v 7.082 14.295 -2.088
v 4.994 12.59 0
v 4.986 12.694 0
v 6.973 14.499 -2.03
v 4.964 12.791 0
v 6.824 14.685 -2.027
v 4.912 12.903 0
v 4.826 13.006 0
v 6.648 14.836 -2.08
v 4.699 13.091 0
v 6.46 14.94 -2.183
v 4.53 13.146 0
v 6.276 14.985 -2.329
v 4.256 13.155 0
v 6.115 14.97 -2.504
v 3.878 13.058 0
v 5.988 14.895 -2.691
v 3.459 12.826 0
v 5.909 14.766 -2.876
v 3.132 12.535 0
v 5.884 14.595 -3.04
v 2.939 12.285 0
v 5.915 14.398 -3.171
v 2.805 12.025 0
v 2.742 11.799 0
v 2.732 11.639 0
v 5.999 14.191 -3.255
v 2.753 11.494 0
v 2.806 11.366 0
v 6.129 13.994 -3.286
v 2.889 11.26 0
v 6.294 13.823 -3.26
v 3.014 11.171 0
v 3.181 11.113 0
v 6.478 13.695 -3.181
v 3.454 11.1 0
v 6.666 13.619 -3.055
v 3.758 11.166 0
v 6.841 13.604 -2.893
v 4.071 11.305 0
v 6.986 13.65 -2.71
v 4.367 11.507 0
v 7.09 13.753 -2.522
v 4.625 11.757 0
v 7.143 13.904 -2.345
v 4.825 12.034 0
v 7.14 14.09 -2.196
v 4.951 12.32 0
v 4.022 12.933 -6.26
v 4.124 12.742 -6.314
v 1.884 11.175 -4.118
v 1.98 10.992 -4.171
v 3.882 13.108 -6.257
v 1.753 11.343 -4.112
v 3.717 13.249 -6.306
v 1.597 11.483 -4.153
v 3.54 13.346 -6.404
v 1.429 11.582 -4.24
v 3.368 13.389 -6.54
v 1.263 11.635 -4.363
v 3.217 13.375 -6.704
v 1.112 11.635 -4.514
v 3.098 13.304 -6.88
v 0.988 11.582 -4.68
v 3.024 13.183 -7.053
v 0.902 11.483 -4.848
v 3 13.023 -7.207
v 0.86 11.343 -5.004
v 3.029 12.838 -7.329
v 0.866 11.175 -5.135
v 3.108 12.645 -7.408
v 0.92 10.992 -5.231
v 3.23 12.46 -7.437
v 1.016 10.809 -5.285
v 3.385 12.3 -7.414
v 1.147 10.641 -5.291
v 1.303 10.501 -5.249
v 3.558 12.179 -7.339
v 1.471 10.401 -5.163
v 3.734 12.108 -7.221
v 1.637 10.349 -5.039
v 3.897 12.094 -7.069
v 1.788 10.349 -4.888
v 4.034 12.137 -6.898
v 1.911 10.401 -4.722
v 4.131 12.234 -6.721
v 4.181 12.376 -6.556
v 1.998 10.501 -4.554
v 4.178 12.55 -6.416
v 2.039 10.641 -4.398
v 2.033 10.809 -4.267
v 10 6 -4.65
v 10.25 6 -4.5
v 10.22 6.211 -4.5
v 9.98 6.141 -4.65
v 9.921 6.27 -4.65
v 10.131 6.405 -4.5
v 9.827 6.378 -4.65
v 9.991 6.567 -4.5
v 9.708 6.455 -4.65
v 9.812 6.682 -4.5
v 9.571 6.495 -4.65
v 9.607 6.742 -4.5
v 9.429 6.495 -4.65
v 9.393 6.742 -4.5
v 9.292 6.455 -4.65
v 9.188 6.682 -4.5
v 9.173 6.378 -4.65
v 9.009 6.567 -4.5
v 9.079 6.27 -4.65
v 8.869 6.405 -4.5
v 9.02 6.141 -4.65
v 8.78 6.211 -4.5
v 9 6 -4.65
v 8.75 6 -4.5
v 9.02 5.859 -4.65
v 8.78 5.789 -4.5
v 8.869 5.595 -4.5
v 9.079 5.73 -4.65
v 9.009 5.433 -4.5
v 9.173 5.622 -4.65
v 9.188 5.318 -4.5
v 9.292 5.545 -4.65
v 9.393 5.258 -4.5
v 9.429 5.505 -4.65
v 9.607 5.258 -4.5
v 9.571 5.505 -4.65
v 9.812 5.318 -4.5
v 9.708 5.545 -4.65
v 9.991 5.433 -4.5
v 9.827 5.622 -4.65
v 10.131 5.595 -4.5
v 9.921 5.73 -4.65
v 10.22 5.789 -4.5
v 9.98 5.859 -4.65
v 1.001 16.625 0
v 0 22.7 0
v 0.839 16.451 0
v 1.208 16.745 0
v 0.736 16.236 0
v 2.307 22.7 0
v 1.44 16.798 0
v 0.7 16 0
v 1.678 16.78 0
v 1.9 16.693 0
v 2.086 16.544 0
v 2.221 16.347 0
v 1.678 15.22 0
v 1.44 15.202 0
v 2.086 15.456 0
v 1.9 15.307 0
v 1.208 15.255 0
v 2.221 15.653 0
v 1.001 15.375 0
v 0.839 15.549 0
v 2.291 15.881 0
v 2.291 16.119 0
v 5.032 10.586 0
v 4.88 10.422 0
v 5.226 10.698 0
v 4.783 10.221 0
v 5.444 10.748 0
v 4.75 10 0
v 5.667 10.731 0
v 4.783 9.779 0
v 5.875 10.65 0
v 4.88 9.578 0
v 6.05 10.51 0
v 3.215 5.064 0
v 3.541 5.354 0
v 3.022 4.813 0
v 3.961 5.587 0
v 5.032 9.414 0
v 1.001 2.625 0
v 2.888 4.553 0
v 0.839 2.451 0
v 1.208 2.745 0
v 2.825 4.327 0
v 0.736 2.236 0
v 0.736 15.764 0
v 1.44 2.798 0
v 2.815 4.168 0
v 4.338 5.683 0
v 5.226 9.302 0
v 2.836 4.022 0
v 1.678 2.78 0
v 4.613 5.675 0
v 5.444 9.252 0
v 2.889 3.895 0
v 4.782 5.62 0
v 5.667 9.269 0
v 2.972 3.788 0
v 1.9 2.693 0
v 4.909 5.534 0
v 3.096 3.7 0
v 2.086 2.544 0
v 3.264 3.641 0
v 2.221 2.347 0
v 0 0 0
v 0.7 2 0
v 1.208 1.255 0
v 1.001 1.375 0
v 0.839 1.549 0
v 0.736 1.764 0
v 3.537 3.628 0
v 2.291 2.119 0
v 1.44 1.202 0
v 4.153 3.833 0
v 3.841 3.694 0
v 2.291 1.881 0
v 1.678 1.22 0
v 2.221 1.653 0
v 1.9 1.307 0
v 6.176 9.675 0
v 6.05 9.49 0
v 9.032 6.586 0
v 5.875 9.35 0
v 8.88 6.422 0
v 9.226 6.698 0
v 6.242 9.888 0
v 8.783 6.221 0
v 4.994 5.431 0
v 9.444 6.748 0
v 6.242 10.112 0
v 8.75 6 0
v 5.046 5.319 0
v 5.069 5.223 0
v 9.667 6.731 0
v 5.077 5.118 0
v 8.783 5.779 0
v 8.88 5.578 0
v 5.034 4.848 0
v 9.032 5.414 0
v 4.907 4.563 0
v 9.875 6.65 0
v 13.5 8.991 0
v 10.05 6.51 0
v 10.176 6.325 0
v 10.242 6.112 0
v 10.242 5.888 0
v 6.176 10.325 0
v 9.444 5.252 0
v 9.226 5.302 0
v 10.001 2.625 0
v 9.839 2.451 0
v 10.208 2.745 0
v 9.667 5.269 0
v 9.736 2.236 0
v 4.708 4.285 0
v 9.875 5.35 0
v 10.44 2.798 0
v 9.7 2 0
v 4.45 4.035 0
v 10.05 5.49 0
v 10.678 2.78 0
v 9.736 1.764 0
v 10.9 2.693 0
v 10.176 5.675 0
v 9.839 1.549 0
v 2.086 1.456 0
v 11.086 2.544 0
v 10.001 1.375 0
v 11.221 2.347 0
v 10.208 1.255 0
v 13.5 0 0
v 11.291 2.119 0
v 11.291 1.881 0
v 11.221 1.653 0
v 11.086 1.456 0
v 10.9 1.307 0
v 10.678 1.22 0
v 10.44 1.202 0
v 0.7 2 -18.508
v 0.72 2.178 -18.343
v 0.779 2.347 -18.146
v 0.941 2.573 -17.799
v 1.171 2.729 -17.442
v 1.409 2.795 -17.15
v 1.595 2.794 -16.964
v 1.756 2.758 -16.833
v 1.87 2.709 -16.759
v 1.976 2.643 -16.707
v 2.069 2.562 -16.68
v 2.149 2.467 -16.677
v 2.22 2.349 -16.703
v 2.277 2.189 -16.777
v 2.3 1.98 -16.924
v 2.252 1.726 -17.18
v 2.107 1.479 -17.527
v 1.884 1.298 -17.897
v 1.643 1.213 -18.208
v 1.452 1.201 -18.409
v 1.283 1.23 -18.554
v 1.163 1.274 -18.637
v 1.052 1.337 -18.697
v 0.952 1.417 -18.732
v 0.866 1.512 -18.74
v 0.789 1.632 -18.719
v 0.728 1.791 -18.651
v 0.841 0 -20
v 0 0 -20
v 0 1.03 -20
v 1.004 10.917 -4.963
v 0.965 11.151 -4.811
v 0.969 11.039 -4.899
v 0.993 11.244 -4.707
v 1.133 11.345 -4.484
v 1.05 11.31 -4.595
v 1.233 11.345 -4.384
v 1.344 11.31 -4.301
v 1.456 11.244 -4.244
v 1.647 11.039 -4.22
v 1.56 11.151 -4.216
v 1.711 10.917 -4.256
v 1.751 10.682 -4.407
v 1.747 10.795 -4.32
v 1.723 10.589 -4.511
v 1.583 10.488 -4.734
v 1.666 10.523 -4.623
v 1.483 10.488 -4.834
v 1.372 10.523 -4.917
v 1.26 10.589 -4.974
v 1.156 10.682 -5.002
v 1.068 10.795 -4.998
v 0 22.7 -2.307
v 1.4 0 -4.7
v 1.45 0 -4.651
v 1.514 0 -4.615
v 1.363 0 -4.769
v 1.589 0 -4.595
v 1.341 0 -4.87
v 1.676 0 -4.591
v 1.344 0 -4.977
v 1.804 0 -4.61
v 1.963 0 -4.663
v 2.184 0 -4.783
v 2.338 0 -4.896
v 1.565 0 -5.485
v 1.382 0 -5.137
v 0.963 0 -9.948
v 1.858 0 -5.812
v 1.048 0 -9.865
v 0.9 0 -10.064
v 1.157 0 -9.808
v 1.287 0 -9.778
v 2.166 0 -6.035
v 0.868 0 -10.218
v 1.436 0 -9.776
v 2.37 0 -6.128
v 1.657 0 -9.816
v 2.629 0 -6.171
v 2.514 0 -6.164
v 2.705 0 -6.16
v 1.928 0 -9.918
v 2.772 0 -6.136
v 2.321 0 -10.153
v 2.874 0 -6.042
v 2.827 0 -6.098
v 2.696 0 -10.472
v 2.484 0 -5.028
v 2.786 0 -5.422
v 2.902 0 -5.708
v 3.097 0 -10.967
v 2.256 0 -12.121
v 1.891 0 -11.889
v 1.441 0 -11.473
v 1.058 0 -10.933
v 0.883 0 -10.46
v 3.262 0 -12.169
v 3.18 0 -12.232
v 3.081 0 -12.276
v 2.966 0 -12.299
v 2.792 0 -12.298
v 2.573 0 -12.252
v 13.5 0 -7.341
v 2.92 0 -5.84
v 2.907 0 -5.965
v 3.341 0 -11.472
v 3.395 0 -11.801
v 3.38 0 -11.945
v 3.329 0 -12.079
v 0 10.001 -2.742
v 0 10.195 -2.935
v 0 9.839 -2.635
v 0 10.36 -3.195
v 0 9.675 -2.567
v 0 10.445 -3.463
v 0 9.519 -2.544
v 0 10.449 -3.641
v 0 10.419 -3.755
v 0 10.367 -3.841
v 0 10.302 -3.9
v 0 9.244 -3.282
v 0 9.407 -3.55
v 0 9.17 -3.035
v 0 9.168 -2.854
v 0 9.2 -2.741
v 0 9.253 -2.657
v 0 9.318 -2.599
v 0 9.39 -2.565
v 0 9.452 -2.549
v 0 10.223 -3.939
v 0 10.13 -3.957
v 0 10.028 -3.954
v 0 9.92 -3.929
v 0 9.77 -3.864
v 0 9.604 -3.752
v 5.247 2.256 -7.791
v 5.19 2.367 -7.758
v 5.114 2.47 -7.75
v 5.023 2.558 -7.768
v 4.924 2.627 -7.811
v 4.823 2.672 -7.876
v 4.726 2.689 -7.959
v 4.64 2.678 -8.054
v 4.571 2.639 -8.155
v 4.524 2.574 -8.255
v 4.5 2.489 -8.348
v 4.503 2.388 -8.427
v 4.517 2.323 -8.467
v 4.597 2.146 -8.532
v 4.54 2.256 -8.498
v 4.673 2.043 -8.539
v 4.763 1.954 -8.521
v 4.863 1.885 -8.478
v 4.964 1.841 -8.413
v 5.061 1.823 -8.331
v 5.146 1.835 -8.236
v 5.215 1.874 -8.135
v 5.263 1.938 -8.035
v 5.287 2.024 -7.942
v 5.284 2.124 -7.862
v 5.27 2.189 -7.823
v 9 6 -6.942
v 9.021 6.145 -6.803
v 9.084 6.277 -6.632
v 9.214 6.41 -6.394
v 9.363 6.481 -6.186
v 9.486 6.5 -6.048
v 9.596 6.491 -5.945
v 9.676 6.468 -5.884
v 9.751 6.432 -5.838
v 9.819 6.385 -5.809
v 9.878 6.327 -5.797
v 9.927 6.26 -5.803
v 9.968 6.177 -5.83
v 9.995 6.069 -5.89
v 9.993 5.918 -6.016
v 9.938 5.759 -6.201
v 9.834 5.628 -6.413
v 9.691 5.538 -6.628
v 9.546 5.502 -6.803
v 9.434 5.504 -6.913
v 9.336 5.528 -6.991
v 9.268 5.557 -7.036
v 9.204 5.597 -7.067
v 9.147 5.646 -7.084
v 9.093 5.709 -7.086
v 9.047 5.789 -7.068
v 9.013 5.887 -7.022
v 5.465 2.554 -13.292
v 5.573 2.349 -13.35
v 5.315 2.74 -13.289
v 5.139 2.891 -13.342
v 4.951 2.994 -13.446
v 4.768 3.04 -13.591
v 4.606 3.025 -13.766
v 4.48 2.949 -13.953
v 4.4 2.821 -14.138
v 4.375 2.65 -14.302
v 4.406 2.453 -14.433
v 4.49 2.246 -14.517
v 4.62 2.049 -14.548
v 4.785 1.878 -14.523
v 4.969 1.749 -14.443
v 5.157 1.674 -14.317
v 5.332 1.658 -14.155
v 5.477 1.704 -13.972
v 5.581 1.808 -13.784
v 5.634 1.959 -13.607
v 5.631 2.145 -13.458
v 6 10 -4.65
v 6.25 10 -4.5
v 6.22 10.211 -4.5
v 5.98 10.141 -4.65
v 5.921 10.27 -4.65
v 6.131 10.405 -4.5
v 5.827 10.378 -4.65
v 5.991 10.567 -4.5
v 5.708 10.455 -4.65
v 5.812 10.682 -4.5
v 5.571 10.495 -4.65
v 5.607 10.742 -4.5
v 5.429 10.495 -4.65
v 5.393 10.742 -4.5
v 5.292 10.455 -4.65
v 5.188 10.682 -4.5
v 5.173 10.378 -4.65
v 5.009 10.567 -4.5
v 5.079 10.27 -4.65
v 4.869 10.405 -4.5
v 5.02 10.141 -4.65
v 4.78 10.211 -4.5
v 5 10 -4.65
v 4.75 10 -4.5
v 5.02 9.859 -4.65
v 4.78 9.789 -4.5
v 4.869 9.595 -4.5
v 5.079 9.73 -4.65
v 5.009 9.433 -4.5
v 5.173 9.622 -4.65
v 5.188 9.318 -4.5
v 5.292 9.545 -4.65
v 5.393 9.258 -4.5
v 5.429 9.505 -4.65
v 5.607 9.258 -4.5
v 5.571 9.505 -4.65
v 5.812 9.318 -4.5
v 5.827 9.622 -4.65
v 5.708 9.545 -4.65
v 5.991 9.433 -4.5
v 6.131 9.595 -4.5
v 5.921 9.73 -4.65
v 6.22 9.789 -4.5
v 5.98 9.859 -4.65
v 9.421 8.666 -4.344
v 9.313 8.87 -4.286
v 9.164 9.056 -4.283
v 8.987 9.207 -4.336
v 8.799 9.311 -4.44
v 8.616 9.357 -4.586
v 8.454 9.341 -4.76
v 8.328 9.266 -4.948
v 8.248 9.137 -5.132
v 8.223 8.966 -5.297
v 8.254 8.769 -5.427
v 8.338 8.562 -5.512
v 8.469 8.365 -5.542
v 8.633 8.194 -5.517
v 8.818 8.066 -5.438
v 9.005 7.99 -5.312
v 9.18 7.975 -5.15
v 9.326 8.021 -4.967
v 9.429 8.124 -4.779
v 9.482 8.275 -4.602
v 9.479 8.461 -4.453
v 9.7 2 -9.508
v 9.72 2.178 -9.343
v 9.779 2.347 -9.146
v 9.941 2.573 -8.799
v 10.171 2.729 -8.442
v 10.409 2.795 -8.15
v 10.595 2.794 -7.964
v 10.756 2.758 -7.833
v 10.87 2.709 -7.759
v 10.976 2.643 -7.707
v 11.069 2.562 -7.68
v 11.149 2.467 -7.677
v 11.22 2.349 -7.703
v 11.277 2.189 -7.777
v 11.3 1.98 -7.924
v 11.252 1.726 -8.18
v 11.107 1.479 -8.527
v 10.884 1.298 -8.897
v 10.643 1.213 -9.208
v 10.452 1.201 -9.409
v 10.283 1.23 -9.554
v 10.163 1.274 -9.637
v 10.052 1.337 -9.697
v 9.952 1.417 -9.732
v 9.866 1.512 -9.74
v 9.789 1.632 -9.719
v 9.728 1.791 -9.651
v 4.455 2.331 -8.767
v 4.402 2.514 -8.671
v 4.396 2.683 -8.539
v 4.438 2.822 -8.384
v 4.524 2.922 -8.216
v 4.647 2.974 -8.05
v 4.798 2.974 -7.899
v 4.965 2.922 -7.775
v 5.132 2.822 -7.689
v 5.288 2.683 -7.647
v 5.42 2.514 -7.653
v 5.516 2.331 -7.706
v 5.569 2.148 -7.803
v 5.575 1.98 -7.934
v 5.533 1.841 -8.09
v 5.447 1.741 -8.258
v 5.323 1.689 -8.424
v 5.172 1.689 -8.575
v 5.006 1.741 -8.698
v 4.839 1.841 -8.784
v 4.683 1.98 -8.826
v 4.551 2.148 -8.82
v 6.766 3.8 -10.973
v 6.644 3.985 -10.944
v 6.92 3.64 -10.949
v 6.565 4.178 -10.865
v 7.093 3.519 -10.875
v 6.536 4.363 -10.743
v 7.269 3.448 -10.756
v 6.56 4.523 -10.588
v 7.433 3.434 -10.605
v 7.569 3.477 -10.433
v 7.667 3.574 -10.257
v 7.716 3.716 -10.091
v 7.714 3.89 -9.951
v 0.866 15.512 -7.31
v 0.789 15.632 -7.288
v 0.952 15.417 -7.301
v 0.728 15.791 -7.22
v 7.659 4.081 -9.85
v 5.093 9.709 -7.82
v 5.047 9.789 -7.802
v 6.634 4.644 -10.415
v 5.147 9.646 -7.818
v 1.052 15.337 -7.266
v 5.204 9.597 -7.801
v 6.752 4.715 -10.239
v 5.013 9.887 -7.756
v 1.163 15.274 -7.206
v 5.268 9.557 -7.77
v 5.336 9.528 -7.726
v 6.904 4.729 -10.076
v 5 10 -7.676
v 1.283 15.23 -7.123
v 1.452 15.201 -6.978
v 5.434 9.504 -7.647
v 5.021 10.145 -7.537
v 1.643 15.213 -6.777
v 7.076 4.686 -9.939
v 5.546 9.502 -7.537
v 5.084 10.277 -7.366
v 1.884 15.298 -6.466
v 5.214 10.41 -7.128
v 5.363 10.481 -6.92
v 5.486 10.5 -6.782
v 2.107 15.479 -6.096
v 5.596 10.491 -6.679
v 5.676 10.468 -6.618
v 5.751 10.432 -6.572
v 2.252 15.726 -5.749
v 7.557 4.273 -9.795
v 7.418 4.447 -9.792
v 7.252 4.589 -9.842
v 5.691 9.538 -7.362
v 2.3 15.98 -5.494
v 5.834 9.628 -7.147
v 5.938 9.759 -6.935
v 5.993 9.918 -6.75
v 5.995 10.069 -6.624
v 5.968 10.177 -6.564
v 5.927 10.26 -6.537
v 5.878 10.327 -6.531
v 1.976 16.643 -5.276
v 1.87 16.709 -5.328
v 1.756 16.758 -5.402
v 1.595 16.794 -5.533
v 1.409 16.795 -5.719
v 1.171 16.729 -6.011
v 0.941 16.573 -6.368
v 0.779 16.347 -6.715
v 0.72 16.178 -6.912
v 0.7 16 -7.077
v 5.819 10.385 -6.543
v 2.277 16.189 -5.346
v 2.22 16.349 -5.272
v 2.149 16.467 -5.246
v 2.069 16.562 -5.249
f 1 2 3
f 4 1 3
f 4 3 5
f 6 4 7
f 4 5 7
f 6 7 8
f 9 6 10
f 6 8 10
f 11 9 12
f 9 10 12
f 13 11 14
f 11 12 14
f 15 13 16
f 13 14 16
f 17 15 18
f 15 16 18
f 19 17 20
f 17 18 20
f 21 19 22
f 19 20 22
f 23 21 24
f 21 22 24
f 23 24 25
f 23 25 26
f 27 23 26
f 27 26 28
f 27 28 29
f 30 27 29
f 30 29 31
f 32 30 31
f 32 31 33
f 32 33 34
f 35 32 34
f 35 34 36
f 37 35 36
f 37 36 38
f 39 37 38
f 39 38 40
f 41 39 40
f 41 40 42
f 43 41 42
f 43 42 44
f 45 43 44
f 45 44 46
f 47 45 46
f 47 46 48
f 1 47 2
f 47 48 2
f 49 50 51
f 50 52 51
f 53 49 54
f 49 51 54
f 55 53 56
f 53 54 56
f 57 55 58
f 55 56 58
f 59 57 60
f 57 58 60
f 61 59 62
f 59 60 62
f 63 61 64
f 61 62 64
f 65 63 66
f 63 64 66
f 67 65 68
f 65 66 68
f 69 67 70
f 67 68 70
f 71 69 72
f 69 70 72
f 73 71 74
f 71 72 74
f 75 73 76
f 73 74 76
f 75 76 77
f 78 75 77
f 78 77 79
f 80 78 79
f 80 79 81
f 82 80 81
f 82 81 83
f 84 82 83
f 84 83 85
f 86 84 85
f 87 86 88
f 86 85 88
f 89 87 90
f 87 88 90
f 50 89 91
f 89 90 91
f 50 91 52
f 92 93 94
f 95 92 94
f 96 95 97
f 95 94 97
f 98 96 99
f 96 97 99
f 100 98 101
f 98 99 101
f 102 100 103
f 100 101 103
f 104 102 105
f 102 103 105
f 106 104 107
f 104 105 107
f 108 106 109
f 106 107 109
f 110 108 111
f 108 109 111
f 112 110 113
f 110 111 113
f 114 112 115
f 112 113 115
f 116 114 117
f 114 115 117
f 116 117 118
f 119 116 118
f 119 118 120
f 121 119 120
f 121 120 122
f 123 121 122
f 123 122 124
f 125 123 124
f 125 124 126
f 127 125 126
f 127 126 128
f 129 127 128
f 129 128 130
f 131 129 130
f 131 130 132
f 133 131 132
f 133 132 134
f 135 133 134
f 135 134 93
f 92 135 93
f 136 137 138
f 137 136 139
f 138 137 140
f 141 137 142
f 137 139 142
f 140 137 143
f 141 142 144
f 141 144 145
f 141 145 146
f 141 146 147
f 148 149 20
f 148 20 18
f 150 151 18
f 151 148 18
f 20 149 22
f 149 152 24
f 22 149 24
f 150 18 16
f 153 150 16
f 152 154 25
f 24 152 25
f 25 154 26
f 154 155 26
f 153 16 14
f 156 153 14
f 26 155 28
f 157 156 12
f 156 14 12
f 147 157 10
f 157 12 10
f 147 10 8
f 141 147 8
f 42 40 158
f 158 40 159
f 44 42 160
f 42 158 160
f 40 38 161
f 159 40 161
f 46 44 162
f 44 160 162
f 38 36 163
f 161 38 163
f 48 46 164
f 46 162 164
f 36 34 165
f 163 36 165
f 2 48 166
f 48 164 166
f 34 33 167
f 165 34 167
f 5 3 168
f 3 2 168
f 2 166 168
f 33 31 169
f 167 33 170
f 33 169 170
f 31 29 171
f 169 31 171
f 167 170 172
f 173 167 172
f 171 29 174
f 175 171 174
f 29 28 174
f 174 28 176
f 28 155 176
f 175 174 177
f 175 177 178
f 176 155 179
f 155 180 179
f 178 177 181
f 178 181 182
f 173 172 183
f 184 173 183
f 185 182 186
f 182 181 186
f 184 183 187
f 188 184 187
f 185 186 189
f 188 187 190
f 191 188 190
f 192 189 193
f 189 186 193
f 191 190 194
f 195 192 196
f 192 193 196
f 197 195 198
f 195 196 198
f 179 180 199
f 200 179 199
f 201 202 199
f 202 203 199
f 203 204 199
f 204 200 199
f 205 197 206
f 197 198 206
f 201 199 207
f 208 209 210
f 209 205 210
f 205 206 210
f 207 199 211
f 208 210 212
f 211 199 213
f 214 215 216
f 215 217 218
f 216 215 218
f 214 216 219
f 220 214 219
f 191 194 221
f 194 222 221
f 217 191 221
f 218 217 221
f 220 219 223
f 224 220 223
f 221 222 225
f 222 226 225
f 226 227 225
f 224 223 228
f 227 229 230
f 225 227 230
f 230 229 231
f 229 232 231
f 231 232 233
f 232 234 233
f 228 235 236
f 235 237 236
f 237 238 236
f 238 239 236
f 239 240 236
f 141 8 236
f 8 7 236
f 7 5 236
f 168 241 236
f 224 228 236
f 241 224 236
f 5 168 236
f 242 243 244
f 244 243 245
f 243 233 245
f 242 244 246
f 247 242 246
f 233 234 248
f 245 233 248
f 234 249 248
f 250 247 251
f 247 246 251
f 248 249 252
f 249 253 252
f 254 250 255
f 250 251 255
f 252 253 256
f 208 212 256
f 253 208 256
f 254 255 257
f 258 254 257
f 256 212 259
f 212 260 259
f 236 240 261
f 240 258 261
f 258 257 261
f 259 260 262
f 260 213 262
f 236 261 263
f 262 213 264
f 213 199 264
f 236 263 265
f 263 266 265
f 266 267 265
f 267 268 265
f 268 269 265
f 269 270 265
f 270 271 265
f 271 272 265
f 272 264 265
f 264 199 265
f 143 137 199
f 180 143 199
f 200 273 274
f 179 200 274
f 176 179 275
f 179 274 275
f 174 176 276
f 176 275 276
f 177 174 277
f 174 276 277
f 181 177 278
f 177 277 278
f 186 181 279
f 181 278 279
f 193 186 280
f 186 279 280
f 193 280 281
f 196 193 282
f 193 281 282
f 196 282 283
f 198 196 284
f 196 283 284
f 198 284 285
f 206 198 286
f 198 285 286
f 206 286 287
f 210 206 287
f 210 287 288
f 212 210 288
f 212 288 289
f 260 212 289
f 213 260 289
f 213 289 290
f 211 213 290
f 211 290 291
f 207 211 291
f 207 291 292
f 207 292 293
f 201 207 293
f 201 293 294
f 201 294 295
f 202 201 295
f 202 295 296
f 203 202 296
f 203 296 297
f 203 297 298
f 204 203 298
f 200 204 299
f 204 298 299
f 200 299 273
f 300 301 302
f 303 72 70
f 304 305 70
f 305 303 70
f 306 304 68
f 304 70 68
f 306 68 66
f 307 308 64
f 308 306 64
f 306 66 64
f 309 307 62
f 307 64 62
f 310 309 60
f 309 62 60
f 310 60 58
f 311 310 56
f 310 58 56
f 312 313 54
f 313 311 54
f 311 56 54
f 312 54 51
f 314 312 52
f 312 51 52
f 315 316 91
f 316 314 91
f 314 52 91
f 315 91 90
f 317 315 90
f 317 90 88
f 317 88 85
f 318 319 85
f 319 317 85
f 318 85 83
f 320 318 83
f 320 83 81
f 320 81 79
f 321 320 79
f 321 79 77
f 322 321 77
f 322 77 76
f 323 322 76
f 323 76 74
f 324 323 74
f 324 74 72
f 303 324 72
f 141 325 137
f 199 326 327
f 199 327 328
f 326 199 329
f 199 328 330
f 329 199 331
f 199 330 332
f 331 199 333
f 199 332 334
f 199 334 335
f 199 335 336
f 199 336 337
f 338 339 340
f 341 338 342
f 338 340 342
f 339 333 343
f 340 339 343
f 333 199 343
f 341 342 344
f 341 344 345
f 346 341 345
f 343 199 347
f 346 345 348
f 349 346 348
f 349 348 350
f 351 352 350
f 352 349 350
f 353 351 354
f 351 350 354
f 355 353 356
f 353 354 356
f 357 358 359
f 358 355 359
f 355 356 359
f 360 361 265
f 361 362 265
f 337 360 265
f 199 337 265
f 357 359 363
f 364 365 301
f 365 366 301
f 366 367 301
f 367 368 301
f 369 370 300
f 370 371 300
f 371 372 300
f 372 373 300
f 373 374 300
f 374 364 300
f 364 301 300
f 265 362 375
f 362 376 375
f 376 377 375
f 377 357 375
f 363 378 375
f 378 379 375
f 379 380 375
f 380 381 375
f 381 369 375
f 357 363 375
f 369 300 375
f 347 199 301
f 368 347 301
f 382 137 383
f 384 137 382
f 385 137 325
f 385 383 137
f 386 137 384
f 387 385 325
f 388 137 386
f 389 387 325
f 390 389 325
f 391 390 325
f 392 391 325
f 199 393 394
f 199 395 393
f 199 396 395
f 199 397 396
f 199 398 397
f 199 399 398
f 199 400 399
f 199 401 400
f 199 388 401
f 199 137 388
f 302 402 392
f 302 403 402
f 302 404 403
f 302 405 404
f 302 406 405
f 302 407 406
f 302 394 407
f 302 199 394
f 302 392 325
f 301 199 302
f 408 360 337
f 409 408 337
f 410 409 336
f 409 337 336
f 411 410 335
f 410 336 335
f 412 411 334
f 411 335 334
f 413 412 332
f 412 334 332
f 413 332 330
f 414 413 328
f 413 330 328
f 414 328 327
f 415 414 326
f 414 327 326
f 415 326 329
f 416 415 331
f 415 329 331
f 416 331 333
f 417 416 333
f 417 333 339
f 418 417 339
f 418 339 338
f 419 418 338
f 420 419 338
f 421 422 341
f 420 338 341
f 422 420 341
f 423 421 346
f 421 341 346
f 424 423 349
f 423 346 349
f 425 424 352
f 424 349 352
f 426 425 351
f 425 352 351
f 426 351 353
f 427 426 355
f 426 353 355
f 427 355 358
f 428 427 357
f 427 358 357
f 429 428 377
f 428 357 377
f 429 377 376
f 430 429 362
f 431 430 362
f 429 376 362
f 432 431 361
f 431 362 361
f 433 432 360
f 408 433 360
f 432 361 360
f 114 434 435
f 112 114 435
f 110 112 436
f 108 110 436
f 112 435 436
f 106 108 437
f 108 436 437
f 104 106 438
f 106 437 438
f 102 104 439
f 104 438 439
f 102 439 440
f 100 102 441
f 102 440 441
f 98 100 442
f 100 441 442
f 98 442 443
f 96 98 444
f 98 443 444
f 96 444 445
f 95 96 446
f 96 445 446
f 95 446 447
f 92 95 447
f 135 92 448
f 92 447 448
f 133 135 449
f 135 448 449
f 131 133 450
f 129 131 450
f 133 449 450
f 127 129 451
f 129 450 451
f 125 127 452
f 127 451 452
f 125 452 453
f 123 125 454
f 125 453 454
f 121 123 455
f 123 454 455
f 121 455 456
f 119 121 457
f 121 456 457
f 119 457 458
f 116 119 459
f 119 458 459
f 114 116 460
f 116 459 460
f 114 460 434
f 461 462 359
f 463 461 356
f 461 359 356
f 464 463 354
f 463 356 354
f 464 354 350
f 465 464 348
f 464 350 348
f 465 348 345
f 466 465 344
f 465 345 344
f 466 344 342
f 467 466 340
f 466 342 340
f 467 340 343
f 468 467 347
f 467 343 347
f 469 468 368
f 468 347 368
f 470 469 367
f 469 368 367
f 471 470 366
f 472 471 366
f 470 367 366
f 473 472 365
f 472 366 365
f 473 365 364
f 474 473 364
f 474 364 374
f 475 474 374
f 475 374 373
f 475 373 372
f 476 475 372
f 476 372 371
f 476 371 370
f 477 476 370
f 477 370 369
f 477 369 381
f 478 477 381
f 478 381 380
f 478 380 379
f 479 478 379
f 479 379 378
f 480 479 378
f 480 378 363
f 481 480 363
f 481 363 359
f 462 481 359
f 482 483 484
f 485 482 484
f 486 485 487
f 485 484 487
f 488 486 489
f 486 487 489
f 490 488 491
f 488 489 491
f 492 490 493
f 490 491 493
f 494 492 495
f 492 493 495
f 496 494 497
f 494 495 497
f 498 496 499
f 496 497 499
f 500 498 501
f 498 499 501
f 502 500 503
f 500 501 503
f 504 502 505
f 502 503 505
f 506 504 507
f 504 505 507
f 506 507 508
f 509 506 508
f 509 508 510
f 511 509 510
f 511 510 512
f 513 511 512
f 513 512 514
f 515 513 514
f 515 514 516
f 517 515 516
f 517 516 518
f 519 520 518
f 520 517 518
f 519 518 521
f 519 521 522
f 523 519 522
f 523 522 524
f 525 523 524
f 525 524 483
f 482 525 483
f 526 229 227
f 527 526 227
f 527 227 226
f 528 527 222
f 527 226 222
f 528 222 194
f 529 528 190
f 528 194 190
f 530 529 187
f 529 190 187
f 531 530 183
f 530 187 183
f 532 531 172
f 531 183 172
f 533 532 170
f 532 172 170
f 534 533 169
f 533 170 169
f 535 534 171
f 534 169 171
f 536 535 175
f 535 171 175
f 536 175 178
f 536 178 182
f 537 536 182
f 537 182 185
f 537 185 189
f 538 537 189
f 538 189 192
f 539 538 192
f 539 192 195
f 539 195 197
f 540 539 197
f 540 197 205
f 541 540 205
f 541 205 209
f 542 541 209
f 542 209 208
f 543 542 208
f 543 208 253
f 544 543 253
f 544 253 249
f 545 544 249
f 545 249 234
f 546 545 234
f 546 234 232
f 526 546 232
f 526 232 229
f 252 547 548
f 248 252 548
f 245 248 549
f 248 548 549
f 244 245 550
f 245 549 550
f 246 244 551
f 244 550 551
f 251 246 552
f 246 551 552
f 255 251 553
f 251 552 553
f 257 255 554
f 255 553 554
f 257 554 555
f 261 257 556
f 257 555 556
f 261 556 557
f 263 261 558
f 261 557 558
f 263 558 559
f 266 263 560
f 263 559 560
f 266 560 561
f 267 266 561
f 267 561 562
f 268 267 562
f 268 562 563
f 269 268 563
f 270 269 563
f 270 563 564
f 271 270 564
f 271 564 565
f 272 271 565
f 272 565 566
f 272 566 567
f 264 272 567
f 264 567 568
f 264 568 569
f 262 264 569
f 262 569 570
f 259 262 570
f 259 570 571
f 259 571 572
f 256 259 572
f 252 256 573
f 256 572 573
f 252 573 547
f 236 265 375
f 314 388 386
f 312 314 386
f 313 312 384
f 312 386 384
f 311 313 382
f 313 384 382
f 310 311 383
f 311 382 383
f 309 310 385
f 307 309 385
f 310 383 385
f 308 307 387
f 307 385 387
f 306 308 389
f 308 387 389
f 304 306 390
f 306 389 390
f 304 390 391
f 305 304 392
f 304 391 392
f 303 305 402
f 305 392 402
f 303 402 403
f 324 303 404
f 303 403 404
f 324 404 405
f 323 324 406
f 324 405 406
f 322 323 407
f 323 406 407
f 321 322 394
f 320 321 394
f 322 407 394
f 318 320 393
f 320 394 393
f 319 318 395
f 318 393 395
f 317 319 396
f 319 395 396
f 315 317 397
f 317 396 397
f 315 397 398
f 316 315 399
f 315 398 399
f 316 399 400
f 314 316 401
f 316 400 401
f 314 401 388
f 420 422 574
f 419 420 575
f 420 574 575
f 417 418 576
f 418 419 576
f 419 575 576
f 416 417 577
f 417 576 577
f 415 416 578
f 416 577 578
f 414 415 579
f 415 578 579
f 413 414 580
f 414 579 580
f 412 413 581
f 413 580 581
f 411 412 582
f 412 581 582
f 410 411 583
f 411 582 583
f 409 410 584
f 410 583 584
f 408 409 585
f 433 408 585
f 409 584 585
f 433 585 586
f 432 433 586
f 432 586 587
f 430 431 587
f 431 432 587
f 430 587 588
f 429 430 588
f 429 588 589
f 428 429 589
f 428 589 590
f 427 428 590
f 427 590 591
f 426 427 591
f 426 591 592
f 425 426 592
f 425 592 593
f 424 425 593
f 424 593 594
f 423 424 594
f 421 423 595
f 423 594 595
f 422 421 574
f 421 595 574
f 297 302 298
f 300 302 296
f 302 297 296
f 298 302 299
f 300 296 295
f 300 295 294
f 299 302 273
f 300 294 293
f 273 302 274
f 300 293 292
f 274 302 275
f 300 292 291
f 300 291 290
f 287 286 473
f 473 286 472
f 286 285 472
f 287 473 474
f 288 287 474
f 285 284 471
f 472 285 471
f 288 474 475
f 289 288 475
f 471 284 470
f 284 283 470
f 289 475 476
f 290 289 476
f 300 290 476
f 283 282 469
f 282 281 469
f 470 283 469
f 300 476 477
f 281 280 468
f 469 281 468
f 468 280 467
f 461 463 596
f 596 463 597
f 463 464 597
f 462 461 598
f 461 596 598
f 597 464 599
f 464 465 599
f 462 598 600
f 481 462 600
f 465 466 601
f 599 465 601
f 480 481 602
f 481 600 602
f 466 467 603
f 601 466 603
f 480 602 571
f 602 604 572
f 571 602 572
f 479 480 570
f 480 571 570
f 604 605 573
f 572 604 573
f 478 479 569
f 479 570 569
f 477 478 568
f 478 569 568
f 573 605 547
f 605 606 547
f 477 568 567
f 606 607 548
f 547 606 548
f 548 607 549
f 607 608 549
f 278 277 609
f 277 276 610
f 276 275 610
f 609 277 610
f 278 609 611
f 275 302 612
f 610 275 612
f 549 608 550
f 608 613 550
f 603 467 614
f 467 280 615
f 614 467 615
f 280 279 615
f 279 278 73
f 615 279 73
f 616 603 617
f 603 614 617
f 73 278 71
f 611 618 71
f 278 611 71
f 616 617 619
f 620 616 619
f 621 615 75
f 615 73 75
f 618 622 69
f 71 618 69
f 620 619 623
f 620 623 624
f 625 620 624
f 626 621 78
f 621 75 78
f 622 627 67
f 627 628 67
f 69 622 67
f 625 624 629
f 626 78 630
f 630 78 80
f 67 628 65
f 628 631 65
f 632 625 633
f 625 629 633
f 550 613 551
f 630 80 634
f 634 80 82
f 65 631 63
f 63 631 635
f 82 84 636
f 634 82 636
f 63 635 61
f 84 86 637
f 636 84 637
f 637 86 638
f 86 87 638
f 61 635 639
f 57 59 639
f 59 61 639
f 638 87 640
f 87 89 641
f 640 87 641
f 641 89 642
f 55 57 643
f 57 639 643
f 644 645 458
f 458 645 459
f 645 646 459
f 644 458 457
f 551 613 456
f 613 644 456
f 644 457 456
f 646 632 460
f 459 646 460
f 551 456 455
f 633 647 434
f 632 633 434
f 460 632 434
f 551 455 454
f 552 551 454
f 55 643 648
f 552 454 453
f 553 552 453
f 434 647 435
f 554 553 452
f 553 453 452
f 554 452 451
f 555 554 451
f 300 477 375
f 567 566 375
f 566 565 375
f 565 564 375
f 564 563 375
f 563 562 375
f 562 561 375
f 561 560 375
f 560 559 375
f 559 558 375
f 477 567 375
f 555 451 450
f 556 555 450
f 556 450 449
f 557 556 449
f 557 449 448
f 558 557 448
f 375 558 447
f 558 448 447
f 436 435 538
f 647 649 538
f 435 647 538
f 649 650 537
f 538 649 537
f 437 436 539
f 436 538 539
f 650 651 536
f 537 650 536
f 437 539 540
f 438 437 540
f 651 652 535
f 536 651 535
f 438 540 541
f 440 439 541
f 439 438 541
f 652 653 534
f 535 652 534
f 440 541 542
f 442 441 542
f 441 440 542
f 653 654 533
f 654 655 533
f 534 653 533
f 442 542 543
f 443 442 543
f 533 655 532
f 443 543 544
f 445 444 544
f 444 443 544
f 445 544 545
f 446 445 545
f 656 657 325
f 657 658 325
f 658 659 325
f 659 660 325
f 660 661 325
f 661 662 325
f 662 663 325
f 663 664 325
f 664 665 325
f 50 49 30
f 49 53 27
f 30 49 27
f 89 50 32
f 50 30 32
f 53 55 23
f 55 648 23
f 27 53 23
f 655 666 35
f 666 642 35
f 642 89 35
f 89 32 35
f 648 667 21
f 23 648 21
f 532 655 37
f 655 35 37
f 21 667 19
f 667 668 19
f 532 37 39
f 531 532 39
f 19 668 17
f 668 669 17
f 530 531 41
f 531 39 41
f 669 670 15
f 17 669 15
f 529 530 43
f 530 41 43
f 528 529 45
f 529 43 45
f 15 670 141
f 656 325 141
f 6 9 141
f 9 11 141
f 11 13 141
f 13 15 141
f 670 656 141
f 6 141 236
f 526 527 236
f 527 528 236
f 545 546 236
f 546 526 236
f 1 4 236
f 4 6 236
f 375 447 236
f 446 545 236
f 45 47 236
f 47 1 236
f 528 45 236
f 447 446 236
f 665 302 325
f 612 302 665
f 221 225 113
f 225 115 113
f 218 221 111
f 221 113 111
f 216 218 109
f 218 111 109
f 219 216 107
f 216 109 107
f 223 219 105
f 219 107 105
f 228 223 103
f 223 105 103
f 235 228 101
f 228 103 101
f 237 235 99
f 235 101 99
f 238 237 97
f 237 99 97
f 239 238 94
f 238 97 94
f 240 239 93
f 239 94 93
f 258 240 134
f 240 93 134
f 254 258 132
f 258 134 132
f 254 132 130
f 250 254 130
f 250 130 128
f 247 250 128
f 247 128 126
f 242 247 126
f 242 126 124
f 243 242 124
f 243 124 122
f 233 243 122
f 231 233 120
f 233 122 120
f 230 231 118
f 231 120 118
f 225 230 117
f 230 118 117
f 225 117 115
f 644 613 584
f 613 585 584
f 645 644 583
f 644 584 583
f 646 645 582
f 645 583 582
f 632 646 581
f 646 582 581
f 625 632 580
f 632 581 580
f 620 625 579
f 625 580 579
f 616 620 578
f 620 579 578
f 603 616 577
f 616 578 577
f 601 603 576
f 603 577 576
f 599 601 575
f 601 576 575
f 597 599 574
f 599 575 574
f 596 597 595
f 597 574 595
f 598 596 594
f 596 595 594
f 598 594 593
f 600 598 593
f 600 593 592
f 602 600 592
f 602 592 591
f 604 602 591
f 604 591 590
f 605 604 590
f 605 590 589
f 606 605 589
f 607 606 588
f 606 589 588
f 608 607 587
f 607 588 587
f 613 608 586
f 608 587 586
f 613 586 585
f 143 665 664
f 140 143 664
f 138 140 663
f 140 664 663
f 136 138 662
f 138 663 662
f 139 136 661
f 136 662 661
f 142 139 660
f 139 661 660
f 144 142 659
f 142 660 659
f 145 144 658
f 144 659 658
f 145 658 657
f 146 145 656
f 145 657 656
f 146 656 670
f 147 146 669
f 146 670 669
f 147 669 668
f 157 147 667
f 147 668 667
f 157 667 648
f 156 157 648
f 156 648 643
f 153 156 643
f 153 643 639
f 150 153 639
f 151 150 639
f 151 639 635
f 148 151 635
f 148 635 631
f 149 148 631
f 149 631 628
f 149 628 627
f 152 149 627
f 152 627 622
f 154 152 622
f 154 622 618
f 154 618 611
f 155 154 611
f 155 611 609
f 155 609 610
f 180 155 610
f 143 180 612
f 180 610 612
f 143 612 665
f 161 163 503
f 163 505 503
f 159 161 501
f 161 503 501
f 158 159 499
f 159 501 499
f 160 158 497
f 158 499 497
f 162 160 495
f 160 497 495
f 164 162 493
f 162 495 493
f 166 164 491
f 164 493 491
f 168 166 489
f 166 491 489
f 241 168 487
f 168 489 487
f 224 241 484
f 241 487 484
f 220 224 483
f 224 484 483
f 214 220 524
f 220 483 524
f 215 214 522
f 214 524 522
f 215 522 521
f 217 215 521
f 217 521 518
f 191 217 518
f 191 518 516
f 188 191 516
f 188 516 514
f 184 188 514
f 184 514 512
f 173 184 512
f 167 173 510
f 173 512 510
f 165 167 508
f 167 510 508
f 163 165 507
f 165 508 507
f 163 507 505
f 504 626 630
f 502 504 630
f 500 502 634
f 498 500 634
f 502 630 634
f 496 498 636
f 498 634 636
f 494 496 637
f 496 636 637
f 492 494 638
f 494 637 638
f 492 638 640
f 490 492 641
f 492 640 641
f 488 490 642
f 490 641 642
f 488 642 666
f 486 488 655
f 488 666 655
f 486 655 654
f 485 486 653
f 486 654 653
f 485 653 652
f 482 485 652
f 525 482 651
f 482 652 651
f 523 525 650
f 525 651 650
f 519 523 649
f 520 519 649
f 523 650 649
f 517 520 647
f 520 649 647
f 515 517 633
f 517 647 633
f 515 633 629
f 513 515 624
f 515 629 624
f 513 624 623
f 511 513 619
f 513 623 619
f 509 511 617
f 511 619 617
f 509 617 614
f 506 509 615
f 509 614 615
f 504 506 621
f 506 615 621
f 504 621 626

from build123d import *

# Parameters (mm, degrees)
SKETCH1_W                       = 13.5
SKETCH1_H                       = 20
BOSS_EXTRUDE1_DEPTH             = 22.7
SKETCH2_W                       = 50.012416784
SKETCH2_H                       = 57.752903126
CUT_EXTRUDE1_DEPTH              = 22.813888303
M2X0_4_TAPPED_HOLE1_D           = 1.6
M2X0_4_TAPPED_HOLE1_ON_FACE_2_D = 1.6
M2X0_4_TAPPED_HOLE1_ON_FACE_3_D = 1.6
M2X0_4_TAPPED_HOLE3_D           = 1.6
F_1_0MM_DOWEL_HOLE1_D           = 1
F_1_5MM_DOWEL_HOLE1_D           = 1.5
F_1_5MM_DOWEL_HOLE1_DEPTH       = 4.5
F_1_5MM_DOWEL_HOLE1_TIP         = 0.450645464
F_1_0MM_DOWEL_HOLE2_D           = 1
F_1_0MM_DOWEL_HOLE2_ON_FACE_2_D = 1
F_1_5MM_DOWEL_HOLE2_D           = 1.5
F_1_5MM_DOWEL_HOLE2_DEPTH       = 3.5
F_1_5MM_DOWEL_HOLE2_TIP         = 0.450645464


with BuildPart() as part:
    # Sketch1 → Boss-Extrude1 (new body)
    with BuildSketch(Plane(origin=(0, 0, 0), x_dir=(1, 0, 0), z_dir=(0, 1, 0))):
        with Locations((6.75, 10)):
            Rectangle(SKETCH1_W, SKETCH1_H)
    extrude(amount=BOSS_EXTRUDE1_DEPTH)

    # Sketch2 → Cut-Extrude1 (cut, through all)
    with BuildSketch(Plane(origin=(7.815425957, 6.381268572, -7.815425957), x_dir=(0.7905694150420965, -0.3872983346207431, 0.4743416490252531), z_dir=(-0.6123724356957925, -0.5000000000000046, 0.6123724356957929))):
        Rectangle(SKETCH2_W, SKETCH2_H)
    extrude(amount=-CUT_EXTRUDE1_DEPTH, mode=Mode.SUBTRACT)

    # M2x0.4 Tapped Hole1 (through all)
    with Locations(Plane(origin=(6.5161982, 14.294607438, -2.653439586), x_dir=(-0.707106781187, 0, -0.707106781187), z_dir=(0.612372435696, 0.5, -0.612372435696))):
        with Locations((0, 0)):
            Hole(M2X0_4_TAPPED_HOLE1_D / 2)

    # M2x0.4 Tapped Hole1 on face 2 (through all)
    with Locations(Plane(origin=(8.855545244, 8.665670048, -4.910100675), x_dir=(-0.707106781187, 0, -0.707106781187), z_dir=(0.612372326772, 0.500000266808, -0.612372326772))):
        with Locations((0, 0)):
            Hole(M2X0_4_TAPPED_HOLE1_ON_FACE_2_D / 2)

    # M2x0.4 Tapped Hole1 on face 3 (through all)
    with Locations(Plane(origin=(5.007385282, 2.349364905, -13.91550219), x_dir=(-0.707106781187, 0, -0.707106781187), z_dir=(0.612372326772, 0.500000266808, -0.612372326772))):
        with Locations((0, 0)):
            Hole(M2X0_4_TAPPED_HOLE1_ON_FACE_3_D / 2)

    # M2x0.4 Tapped Hole3 (through all)
    with Locations(Plane(origin=(1.5, 16, 0), x_dir=(1, 0, 0), z_dir=(0, 0, 1))):
        with Locations((0, 0), (0, -14), (9, -14)):
            Hole(M2X0_4_TAPPED_HOLE3_D / 2)

    # Ø1.0mm Dowel Hole1 (through all)
    with Locations(Plane(origin=(5.5, 10, 0), x_dir=(1, 0, 0), z_dir=(0, 0, 1))):
        with Locations((0, 0), (4, -4)):
            Hole(F_1_0MM_DOWEL_HOLE1_D / 2)

    # Ø1.5mm Dowel Hole1
    with Locations(Plane(origin=(5.5, 10, 0), x_dir=(1, 0, 0), z_dir=(0, 0, 1))):
        with Locations((0, 0), (4, -4)):
            Hole(F_1_5MM_DOWEL_HOLE1_D / 2, depth=F_1_5MM_DOWEL_HOLE1_DEPTH)
            with Locations((0, 0, -(F_1_5MM_DOWEL_HOLE1_DEPTH + F_1_5MM_DOWEL_HOLE1_TIP / 2))):  # 118° drill point
                Cone(0, F_1_5MM_DOWEL_HOLE1_D / 2, F_1_5MM_DOWEL_HOLE1_TIP, mode=Mode.SUBTRACT)

    # Ø1.0mm Dowel Hole2 (through all)
    with Locations(Plane(origin=(3.59317172, 12.741669751, -6.844434378), x_dir=(-0.707106781187, 0, -0.707106781187), z_dir=(0.612372435696, 0.5, -0.612372435696))):
        with Locations((0, 0)):
            Hole(F_1_0MM_DOWEL_HOLE2_D / 2)

    # Ø1.0mm Dowel Hole2 on face 2 (through all)
    with Locations(Plane(origin=(7.128705626, 4.081415713, -10.379968284), x_dir=(-0.707106781187, 0, -0.707106781187), z_dir=(0.612372326772, 0.500000266808, -0.612372326772))):
        with Locations((0, 0)):
            Hole(F_1_0MM_DOWEL_HOLE2_ON_FACE_2_D / 2)

    # Ø1.5mm Dowel Hole2
    with Locations(Plane(origin=(3.59317172, 12.741669751, -6.844434378), x_dir=(-0.707106781187, 0, -0.707106781187), z_dir=(0.612372435696, 0.5, -0.612372435696))):
        with Locations((0, 0), (0, -10)):
            Hole(F_1_5MM_DOWEL_HOLE2_D / 2, depth=F_1_5MM_DOWEL_HOLE2_DEPTH)
            with Locations((0, 0, -(F_1_5MM_DOWEL_HOLE2_DEPTH + F_1_5MM_DOWEL_HOLE2_TIP / 2))):  # 118° drill point
                Cone(0, F_1_5MM_DOWEL_HOLE2_D / 2, F_1_5MM_DOWEL_HOLE2_TIP, mode=Mode.SUBTRACT)


solid = part.part
